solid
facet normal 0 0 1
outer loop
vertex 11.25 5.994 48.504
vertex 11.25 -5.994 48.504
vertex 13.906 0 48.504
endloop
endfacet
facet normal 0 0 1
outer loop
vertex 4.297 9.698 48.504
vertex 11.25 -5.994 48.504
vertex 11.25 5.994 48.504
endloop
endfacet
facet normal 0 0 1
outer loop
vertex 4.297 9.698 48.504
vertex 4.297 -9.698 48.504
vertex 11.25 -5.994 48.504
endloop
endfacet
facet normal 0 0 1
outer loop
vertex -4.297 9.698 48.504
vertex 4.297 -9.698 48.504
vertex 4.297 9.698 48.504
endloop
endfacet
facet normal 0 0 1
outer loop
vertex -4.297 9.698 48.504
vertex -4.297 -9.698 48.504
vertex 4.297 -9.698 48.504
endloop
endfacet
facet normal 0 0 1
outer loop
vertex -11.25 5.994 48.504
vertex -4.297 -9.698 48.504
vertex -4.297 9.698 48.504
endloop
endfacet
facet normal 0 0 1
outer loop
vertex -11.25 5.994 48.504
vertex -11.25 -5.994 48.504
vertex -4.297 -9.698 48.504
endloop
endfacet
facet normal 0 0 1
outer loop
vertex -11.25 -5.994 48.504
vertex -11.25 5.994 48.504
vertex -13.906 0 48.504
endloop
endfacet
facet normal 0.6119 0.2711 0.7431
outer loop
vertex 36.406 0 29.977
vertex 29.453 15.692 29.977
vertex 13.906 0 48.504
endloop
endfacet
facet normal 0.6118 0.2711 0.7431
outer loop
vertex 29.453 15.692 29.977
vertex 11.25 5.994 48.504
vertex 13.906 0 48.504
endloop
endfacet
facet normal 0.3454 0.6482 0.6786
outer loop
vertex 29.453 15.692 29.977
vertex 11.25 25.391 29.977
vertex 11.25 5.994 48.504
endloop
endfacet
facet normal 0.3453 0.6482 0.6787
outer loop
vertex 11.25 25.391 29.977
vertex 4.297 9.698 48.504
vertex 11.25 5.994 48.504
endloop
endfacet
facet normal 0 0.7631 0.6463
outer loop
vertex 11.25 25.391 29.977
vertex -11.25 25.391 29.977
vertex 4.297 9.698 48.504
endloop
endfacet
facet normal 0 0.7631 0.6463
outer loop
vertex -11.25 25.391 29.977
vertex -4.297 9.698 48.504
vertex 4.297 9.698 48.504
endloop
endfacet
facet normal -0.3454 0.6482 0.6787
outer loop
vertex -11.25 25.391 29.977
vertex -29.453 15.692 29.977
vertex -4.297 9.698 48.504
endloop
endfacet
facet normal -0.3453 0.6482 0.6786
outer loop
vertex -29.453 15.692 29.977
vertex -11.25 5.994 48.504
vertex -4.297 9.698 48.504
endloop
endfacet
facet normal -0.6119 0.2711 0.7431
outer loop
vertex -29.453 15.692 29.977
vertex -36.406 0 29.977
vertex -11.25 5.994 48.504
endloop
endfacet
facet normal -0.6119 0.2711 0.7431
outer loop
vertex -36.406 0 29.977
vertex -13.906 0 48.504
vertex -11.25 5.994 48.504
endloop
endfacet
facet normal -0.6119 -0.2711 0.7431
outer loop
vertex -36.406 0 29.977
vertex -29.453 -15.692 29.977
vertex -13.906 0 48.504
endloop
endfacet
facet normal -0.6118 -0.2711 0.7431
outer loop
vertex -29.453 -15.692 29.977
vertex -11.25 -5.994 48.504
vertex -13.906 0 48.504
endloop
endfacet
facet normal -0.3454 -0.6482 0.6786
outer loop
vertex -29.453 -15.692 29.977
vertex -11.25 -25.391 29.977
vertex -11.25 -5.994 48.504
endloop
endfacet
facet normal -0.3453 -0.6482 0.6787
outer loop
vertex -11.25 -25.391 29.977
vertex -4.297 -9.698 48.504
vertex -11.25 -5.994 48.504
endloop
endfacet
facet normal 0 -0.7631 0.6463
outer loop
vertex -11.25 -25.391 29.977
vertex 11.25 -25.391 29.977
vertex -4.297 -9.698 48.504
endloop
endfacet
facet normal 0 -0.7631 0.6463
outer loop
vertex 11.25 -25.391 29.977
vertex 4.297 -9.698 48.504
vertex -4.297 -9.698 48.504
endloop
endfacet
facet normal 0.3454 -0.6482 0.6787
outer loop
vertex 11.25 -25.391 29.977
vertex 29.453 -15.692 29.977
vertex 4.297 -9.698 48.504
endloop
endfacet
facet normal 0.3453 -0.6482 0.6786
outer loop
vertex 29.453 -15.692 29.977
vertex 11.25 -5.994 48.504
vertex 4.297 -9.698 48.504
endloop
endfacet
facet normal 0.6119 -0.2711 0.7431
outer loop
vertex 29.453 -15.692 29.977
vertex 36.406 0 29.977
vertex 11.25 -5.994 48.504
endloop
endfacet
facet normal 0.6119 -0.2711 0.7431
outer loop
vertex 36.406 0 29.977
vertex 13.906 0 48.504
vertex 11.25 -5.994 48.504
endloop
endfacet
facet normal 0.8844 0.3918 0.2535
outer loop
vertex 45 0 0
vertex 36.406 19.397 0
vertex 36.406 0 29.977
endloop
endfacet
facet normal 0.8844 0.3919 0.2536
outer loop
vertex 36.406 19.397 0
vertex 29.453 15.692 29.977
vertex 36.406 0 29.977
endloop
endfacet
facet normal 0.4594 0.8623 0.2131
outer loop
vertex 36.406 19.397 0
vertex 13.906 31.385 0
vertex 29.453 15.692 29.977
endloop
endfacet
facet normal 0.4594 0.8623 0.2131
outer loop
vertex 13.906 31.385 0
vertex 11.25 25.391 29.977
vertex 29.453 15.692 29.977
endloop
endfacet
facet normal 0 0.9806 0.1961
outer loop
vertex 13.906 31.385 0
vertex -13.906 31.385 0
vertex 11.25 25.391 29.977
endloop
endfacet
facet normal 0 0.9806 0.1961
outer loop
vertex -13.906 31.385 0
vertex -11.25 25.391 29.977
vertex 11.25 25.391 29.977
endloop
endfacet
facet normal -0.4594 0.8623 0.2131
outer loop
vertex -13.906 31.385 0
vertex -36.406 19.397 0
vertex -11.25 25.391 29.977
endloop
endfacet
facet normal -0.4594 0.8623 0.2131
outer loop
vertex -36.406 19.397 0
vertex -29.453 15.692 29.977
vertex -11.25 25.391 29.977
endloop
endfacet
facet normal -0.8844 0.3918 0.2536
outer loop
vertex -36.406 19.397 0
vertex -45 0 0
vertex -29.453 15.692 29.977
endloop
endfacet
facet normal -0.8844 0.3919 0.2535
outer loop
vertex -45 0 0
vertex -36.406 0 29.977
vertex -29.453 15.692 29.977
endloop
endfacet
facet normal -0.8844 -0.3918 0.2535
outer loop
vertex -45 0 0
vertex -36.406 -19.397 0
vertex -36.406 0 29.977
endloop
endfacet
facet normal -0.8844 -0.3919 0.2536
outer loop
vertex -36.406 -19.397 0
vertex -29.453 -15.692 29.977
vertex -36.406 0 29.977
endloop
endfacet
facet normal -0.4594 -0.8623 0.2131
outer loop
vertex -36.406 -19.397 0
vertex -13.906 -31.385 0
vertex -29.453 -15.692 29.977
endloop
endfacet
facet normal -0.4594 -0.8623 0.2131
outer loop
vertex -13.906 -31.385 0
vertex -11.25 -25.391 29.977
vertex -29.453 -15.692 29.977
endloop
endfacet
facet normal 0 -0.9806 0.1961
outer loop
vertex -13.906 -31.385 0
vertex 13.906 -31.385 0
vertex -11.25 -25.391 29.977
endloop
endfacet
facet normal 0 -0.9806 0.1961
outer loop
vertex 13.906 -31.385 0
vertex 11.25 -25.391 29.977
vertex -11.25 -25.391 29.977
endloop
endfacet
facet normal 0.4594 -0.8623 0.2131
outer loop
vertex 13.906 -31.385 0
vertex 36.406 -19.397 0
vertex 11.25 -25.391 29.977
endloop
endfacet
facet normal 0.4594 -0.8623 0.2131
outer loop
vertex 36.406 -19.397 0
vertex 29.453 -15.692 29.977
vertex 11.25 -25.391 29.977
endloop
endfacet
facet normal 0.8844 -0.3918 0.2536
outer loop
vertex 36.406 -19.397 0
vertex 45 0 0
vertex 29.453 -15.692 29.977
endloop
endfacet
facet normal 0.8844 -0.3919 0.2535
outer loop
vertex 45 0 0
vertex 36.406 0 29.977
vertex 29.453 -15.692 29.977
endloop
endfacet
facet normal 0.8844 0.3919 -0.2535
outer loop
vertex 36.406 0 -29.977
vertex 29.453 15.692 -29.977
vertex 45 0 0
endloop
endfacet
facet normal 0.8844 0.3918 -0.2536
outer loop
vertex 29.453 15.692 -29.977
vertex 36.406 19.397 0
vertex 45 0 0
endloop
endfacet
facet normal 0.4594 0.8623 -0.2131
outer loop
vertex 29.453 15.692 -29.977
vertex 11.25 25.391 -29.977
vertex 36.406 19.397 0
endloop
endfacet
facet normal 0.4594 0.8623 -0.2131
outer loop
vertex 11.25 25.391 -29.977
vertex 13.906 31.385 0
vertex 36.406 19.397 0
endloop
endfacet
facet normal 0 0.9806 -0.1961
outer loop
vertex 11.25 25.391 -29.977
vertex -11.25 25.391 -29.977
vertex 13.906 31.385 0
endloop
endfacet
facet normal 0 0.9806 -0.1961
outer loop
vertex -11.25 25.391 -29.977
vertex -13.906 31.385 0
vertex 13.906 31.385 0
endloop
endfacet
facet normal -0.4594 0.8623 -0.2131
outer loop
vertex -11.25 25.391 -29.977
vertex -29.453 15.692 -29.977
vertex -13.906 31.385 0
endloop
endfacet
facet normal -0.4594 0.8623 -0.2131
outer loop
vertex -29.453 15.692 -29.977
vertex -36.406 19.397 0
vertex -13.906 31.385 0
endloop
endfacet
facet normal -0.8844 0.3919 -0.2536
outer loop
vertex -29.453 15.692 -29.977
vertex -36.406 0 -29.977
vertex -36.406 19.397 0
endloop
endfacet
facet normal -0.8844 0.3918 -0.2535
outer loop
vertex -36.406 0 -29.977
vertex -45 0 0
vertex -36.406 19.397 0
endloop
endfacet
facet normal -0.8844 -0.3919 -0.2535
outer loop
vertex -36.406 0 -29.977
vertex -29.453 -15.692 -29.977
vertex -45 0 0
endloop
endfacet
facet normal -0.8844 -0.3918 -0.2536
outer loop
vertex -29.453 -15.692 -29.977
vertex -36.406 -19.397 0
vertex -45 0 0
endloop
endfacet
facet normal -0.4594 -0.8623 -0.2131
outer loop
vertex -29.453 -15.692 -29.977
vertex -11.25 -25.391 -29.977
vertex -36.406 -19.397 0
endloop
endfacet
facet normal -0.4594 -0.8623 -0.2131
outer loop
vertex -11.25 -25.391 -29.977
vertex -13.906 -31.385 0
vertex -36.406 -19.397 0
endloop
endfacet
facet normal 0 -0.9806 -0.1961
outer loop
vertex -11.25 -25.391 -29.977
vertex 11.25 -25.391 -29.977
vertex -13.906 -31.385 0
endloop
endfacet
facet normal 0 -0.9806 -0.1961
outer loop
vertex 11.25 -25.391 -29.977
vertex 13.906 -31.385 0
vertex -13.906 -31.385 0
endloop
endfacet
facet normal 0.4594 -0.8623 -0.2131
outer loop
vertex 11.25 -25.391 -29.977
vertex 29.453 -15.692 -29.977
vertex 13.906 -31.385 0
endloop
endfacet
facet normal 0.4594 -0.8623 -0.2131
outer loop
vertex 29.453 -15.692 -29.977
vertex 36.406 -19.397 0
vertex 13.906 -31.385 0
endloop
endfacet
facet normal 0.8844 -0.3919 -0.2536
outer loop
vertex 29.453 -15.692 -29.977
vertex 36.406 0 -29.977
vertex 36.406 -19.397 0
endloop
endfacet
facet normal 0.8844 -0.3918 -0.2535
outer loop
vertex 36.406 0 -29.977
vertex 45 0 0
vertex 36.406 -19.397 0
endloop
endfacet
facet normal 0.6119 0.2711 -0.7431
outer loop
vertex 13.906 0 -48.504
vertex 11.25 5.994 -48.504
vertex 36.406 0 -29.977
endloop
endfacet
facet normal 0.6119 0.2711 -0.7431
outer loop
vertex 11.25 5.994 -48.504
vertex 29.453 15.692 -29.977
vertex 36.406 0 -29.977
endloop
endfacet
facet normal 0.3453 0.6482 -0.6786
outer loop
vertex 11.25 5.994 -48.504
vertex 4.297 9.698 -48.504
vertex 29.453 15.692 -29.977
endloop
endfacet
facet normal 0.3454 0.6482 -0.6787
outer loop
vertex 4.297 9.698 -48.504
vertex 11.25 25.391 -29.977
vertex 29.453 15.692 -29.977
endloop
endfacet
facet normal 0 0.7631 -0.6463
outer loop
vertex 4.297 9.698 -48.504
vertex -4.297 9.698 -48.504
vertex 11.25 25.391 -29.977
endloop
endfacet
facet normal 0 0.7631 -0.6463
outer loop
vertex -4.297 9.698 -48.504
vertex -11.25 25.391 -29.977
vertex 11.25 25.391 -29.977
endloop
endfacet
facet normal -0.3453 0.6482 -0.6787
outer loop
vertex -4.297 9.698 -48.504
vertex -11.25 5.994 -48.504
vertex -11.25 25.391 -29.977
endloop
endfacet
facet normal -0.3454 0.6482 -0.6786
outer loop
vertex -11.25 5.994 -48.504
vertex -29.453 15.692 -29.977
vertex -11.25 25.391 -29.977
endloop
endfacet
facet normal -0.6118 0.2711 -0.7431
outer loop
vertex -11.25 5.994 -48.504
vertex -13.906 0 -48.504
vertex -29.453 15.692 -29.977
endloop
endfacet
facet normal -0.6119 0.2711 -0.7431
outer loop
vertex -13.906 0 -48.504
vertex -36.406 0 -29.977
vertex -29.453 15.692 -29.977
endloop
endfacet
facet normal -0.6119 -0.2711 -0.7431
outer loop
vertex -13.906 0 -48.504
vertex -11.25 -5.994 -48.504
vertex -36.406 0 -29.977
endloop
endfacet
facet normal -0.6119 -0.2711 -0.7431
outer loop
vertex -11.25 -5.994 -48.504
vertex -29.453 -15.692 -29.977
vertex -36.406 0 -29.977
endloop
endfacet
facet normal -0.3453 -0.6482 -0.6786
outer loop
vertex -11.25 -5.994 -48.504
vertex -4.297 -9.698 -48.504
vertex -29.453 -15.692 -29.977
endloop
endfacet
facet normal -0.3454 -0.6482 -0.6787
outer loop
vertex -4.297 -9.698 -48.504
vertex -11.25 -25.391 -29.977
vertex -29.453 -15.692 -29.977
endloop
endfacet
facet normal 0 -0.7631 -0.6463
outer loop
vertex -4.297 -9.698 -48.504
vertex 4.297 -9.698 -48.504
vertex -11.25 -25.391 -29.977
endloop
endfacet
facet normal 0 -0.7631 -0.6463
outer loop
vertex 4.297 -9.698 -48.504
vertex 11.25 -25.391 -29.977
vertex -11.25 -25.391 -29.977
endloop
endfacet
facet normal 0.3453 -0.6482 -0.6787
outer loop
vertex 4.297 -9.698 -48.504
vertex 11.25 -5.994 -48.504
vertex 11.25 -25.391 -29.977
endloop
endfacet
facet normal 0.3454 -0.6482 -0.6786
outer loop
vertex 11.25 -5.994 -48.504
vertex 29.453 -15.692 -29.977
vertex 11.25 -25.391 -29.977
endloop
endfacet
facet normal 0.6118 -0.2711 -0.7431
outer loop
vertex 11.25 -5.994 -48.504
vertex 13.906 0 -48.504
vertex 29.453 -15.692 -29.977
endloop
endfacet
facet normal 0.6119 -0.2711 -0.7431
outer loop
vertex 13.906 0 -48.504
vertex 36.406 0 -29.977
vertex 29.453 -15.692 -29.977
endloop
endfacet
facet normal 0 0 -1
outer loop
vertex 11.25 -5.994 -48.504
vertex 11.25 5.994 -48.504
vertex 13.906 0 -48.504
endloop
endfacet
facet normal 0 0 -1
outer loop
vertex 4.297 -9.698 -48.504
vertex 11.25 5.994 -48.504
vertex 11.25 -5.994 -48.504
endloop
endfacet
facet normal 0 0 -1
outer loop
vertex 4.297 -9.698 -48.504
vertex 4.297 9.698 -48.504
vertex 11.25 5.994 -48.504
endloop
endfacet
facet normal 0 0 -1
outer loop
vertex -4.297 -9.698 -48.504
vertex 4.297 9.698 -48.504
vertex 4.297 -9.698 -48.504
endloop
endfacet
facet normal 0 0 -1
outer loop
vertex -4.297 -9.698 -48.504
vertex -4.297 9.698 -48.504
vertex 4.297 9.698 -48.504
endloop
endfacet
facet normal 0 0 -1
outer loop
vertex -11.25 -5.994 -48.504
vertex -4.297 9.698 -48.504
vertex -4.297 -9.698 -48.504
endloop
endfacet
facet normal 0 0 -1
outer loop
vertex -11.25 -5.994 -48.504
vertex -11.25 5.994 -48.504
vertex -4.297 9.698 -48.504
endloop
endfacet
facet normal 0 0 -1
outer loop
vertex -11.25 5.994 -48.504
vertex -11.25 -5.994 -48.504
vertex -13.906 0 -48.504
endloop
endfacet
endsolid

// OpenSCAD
// Generated by SolidPython 1.0.1 on 2020-07-29 00:46:52


scale(v = [15, 11, 17]) {
	sphere(r = 3);
}
/***********************************************
*********      SolidPython code:      **********
************************************************
 
# import packages: SolidPython
from solid import *
from solid.utils import *
from itertools import chain, combinations, permutations


class Resize:

    def __init__(self, scad_file):
        self.scad_file = scad_file
        #self.scad_file = import_scad(scad_file)
        # cone/cylinder param:
        self.r1 = 0
        self.r2 = 0
        self.h = 0
        # rectangular prism param:
        self.w = 0
        self.l = 0
        # ellipse param:
        self.r = 0

    # import OpenScad code (file name corresponds to shape)


    # classify shape + parameters
    def assign(self, param1, param2, param3):
        if self.scad_file == 'cone.scad':
            self.r1 = param1
            self.r2 = param2
            self.h = param3
        elif self.scad_file == 'cylinder.scad':
            self.r1 = param1
            self.r2 = param2
            self.h = param3
        elif self.scad_file == 'rectangularPrism.scad':
            self.h = param1
            self.l = param2
            self.w = param3
        else:
            self.r = param1
            self.h = param2

    # resize parameters
    def iterate(self):
        x = range(3, 20, 2)
        i = 1
        if self.scad_file == 'cone.scad':
            tempList = list(permutations(x, 2))
            for temp in tempList:
                param1 = temp[0]
                param2 = temp[1]
                filepath = 'produced_scad_files/' + 'cone' + str(param1) + '_' + str(param2) + '_' + '.scad'
                scad_render_to_file(cylinder(h=param1, r1=param2, r2=0), filepath)

        elif self.scad_file == 'cylinder.scad':
            tempList = list(permutations(x, 3))
            for temp in tempList:
                param1 = temp[0]
                param2 = temp[1]
                filepath = 'produced_scad_files/' + 'cylinder' + str(param1) + '_' + str(param2) + '_' + '.scad'
                scad_render_to_file(cylinder(h=param1, r1=param2, r2=param2), filepath)

        elif self.scad_file == 'rectangularPrism.scad':
            tempList = list(permutations(x, 3))
            for temp in tempList:
                param1 = temp[0]
                param2 = temp[1]
                param3 = temp[2]
                filepath = 'produced_scad_files/' + 'rectangularPrism' + str(param1) + '_' + str(param2) + '_' + str(
                    param3) + '.scad'
                scad_render_to_file(cube(size=(param1, param2, param3)), filepath)

        elif self.scad_file == 'ellipse.scad':
            tempList = list(permutations(x, 4))
            for temp in tempList:
                param1 = temp[0]
                param2 = temp[1]
                param3 = temp[2]
                param4 = temp[3]
                filepath = 'produced_scad_files/' + 'ellipse' + str(param1) + '_' + str(param2) + '_' + str(param3) + '_' + str(param4) + '.scad'
                scad_render_to_file(scale([param1, param2, param3])(sphere(r=param4)), filepath)

    def render_to_scadfile(self):
        scad_render_to_file(scad, 'example.scad') 
 
************************************************/
